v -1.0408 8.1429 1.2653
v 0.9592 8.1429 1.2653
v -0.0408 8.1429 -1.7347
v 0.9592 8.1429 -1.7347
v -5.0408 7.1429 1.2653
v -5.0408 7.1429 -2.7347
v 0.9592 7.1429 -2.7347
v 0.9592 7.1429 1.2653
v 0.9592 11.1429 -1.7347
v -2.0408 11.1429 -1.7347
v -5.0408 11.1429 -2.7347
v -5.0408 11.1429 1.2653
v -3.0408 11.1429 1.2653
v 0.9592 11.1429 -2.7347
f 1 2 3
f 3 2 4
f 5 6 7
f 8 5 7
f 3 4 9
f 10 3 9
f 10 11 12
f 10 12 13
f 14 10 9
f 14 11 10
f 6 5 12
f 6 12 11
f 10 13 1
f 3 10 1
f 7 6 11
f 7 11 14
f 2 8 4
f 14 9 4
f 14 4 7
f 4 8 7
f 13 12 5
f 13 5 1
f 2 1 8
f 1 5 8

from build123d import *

# Parameters (mm, degrees)
SKETCH_1_W          = 30
SKETCH_1_H          = 20
EXTRUDE_1_DEPTH     = 20
CUT_EXTRUDE_3_REACH = 39.417
SKETCH_5_W          = 15
SKETCH_5_H          = 15
SCALE_1_SCALE       = 0.2


with BuildPart() as part:
    # 草圖1 → 填料-伸長1 (new body)
    with BuildSketch(Plane(origin=(0, 0, 0), x_dir=(1, 0, 0), z_dir=(0, 1, 0))):
        Rectangle(SKETCH_1_W, SKETCH_1_H)
    extrude(amount=EXTRUDE_1_DEPTH)

    # 除料-伸長3: up to this plane
    cut_extrude_3_end = Plane(origin=(7.5, 5, 2.5), z_dir=(-0.8017837257372732, -0.5345224838248487, -0.2672612419124243))
    # 草圖5 → 除料-伸長3 (cut, up to the surface)
    with BuildSketch(Plane(origin=(15, 0, 0), x_dir=(0, 0, -1), z_dir=(1, 0, 0)), mode=Mode.PRIVATE) as cut_extrude_3_sk1:
        with Locations((-2.5, 12.5)):
            Rectangle(SKETCH_5_W, SKETCH_5_H)
    cut_extrude_3_tool1 = split(extrude(cut_extrude_3_sk1.sketch, amount=-CUT_EXTRUDE_3_REACH, mode=Mode.PRIVATE), bisect_by=cut_extrude_3_end, keep=Keep.BOTH, mode=Mode.PRIVATE)
    add(cut_extrude_3_tool1.solids().sort_by_distance((15, 12.5, 2.5))[0], mode=Mode.SUBTRACT)


with BuildPart() as part_1:
    # 縮放比例1: scaled about (-2.551020408, 8.928571429, -0.918367347)
    add(part.part.scale(SCALE_1_SCALE).moved(Location((-2.040816326, 7.142857143, -0.734693878))))


solid = part_1.part
